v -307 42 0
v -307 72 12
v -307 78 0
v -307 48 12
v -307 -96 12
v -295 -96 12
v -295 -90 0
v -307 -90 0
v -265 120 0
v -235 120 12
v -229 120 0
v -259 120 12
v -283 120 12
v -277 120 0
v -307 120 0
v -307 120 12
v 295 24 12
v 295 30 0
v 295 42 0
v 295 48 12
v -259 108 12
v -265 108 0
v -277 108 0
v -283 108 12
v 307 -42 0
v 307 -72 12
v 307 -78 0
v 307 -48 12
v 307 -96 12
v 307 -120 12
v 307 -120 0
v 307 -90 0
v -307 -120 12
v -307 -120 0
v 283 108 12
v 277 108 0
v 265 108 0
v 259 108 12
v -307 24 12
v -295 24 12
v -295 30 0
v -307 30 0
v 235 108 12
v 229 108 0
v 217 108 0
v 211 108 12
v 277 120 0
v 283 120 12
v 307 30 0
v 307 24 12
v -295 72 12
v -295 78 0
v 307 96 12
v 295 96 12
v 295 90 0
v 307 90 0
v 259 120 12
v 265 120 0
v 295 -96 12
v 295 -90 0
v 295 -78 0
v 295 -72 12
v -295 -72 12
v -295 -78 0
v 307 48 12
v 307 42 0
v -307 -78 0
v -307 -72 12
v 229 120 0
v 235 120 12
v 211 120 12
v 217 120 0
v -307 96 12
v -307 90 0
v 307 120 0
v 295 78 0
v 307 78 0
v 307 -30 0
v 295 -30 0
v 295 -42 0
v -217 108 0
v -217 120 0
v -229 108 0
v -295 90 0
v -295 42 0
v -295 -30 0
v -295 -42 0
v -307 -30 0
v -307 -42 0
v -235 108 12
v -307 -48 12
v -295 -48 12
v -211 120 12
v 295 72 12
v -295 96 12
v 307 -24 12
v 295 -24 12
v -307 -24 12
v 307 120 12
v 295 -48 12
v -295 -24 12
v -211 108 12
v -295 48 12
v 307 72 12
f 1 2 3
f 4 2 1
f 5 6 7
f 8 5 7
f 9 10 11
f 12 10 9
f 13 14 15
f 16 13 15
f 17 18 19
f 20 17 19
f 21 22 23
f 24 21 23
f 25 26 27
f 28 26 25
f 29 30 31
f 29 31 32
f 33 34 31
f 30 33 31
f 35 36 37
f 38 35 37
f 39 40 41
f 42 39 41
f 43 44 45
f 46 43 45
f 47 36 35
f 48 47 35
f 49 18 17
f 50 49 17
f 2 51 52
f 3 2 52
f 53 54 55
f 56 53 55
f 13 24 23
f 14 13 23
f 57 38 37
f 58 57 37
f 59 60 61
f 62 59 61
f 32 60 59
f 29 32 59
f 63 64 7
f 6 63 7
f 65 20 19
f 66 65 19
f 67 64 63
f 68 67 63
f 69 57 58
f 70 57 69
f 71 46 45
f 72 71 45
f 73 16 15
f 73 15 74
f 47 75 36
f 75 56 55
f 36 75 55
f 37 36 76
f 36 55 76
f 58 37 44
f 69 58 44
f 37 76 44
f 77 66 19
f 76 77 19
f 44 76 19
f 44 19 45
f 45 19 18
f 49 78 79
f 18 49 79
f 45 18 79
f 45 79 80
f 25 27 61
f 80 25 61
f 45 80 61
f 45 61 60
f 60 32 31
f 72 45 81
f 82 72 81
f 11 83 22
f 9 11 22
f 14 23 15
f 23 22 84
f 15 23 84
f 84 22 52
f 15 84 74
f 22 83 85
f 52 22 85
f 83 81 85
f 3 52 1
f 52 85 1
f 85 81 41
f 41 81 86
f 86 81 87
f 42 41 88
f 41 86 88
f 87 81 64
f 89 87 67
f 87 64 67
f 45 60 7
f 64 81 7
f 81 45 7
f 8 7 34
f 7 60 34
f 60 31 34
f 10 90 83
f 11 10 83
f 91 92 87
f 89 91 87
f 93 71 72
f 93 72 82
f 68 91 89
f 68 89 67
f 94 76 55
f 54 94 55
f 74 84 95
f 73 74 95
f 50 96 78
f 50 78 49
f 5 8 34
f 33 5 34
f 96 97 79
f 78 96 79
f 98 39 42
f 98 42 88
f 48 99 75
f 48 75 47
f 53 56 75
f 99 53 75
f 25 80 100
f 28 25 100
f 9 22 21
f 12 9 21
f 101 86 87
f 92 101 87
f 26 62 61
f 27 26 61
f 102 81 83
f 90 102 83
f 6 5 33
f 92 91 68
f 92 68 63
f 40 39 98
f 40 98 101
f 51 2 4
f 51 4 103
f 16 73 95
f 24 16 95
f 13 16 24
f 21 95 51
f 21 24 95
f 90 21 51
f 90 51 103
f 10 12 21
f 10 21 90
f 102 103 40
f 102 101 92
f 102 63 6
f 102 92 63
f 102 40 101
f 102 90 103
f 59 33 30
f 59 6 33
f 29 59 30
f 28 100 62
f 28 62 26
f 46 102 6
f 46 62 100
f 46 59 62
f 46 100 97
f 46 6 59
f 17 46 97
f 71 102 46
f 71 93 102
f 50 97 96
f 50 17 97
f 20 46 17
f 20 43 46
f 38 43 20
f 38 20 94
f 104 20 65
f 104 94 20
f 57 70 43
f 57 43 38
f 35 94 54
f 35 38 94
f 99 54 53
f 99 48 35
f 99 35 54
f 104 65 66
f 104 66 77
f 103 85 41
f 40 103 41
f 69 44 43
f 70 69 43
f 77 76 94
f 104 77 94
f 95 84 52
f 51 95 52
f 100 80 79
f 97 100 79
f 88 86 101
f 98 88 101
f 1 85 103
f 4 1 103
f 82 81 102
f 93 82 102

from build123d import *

# Parameters (mm, degrees)
F1_DEPTH  = 12
F3_DEPTH  = 12
F5_DEPTH  = 12
F7_DEPTH  = 12
F9_DEPTH  = 12
F11_DEPTH = 12
F13_DEPTH = 12
F15_DEPTH = 12
F17_DEPTH = 12
F19_DEPTH = 12
F21_DEPTH = 12
F23_DEPTH = 12
F25_DEPTH = 12


with BuildPart() as f1:
    # F0 (on Top) → F1 (new body)
    with BuildSketch(Plane.XY):
        Polygon((-283, 120), (-307, 120), (-307, 96), (-295, 96), (-295, 72), (-307, 72), (-307, 48), (-295, 48), (-295, 24), (-307, 24), (-307, -24), (-295, -24), (-295, -48), (-307, -48), (-307, -72), (-295, -72), (-295, -96), (-307, -96), (-307, -120), (307, -120), (307, -96), (295, -96), (295, -72), (307, -72), (307, -48), (295, -48), (295, -24), (307, -24), (307, 24), (295, 24), (295, 48), (307, 48), (307, 72), (295, 72), (295, 96), (307, 96), (307, 120), (283, 120), (283, 108), (259, 108), (259, 120), (235, 120), (235, 108), (211, 108), (211, 120), (-211, 120), (-211, 108), (-235, 108), (-235, 120), (-259, 120), (-259, 108), (-283, 108), align=None)
    extrude(amount=F1_DEPTH)

    # F2 (on face) → F3 (join)
    with BuildSketch(Plane(origin=(-295, 0, 0), x_dir=(0, -1, 0), z_dir=(-1, 0, 0))):
        Polygon((78, 0), (72, 12), (72, 0), align=None)
        Polygon((96, 0), (96, 12), (90, 0), align=None)
    extrude(amount=F3_DEPTH)

    # F4 (on face) → F5 (join)
    with BuildSketch(Plane(origin=(-295, 0, 0), x_dir=(0, -1, 0), z_dir=(-1, 0, 0))):
        Polygon((30, 0), (24, 12), (24, 0), align=None)
        Polygon((48, 0), (48, 12), (42, 0), align=None)
    extrude(amount=F5_DEPTH)

    # F6 (on face) → F7 (join)
    with BuildSketch(Plane(origin=(-295, 0, 0), x_dir=(0, -1, 0), z_dir=(-1, 0, 0))):
        Polygon((-42, 0), (-48, 12), (-48, 0), align=None)
        Polygon((-24, 0), (-24, 12), (-30, 0), align=None)
    extrude(amount=F7_DEPTH)

    # F8 (on face) → F9 (join)
    with BuildSketch(Plane(origin=(-295, 0, 0), x_dir=(0, -1, 0), z_dir=(-1, 0, 0))):
        Polygon((-90, 0), (-96, 12), (-96, 0), align=None)
        Polygon((-72, 0), (-72, 12), (-78, 0), align=None)
    extrude(amount=F9_DEPTH)

    # F10 (on face) → F11 (join)
    with BuildSketch(Plane.YZ.offset(295)):
        Polygon((-90, 0), (-96, 12), (-96, 0), align=None)
        Polygon((-72, 0), (-72, 12), (-78, 0), align=None)
    extrude(amount=F11_DEPTH)

    # F12 (on face) → F13 (join)
    with BuildSketch(Plane.YZ.offset(295)):
        Polygon((-42, 0), (-48, 12), (-48, 0), align=None)
        Polygon((-24, 0), (-24, 12), (-30, 0), align=None)
    extrude(amount=F13_DEPTH)

    # F14 (on face) → F15 (join)
    with BuildSketch(Plane.YZ.offset(295)):
        Polygon((30, 0), (24, 12), (24, 0), align=None)
        Polygon((48, 0), (48, 12), (42, 0), align=None)
    extrude(amount=F15_DEPTH)

    # F16 (on face) → F17 (join)
    with BuildSketch(Plane.YZ.offset(295)):
        Polygon((78, 0), (72, 12), (72, 0), align=None)
        Polygon((96, 0), (96, 12), (90, 0), align=None)
    extrude(amount=F17_DEPTH)

    # F18 (on face) → F19 (join)
    with BuildSketch(Plane(origin=(0, 108, 0), x_dir=(-1, 0, 0), z_dir=(0, 1, 0))):
        Polygon((-277, 0), (-283, 12), (-283, 0), align=None)
        Polygon((-259, 0), (-259, 12), (-265, 0), align=None)
    extrude(amount=F19_DEPTH)

    # F20 (on face) → F21 (join)
    with BuildSketch(Plane(origin=(0, 108, 0), x_dir=(-1, 0, 0), z_dir=(0, 1, 0))):
        Polygon((-229, 0), (-235, 12), (-235, 0), align=None)
        Polygon((-211, 0), (-211, 12), (-217, 0), align=None)
    extrude(amount=F21_DEPTH)

    # F22 (on face) → F23 (join)
    with BuildSketch(Plane(origin=(0, 108, 0), x_dir=(-1, 0, 0), z_dir=(0, 1, 0))):
        Polygon((217, 0), (211, 12), (211, 0), align=None)
        Polygon((235, 0), (235, 12), (229, 0), align=None)
    extrude(amount=F23_DEPTH)

    # F24 (on face) → F25 (join)
    with BuildSketch(Plane(origin=(0, 108, 0), x_dir=(-1, 0, 0), z_dir=(0, 1, 0))):
        Polygon((265, 0), (259, 12), (259, 0), align=None)
        Polygon((283, 0), (283, 12), (277, 0), align=None)
    extrude(amount=F25_DEPTH)


solid = f1.part
